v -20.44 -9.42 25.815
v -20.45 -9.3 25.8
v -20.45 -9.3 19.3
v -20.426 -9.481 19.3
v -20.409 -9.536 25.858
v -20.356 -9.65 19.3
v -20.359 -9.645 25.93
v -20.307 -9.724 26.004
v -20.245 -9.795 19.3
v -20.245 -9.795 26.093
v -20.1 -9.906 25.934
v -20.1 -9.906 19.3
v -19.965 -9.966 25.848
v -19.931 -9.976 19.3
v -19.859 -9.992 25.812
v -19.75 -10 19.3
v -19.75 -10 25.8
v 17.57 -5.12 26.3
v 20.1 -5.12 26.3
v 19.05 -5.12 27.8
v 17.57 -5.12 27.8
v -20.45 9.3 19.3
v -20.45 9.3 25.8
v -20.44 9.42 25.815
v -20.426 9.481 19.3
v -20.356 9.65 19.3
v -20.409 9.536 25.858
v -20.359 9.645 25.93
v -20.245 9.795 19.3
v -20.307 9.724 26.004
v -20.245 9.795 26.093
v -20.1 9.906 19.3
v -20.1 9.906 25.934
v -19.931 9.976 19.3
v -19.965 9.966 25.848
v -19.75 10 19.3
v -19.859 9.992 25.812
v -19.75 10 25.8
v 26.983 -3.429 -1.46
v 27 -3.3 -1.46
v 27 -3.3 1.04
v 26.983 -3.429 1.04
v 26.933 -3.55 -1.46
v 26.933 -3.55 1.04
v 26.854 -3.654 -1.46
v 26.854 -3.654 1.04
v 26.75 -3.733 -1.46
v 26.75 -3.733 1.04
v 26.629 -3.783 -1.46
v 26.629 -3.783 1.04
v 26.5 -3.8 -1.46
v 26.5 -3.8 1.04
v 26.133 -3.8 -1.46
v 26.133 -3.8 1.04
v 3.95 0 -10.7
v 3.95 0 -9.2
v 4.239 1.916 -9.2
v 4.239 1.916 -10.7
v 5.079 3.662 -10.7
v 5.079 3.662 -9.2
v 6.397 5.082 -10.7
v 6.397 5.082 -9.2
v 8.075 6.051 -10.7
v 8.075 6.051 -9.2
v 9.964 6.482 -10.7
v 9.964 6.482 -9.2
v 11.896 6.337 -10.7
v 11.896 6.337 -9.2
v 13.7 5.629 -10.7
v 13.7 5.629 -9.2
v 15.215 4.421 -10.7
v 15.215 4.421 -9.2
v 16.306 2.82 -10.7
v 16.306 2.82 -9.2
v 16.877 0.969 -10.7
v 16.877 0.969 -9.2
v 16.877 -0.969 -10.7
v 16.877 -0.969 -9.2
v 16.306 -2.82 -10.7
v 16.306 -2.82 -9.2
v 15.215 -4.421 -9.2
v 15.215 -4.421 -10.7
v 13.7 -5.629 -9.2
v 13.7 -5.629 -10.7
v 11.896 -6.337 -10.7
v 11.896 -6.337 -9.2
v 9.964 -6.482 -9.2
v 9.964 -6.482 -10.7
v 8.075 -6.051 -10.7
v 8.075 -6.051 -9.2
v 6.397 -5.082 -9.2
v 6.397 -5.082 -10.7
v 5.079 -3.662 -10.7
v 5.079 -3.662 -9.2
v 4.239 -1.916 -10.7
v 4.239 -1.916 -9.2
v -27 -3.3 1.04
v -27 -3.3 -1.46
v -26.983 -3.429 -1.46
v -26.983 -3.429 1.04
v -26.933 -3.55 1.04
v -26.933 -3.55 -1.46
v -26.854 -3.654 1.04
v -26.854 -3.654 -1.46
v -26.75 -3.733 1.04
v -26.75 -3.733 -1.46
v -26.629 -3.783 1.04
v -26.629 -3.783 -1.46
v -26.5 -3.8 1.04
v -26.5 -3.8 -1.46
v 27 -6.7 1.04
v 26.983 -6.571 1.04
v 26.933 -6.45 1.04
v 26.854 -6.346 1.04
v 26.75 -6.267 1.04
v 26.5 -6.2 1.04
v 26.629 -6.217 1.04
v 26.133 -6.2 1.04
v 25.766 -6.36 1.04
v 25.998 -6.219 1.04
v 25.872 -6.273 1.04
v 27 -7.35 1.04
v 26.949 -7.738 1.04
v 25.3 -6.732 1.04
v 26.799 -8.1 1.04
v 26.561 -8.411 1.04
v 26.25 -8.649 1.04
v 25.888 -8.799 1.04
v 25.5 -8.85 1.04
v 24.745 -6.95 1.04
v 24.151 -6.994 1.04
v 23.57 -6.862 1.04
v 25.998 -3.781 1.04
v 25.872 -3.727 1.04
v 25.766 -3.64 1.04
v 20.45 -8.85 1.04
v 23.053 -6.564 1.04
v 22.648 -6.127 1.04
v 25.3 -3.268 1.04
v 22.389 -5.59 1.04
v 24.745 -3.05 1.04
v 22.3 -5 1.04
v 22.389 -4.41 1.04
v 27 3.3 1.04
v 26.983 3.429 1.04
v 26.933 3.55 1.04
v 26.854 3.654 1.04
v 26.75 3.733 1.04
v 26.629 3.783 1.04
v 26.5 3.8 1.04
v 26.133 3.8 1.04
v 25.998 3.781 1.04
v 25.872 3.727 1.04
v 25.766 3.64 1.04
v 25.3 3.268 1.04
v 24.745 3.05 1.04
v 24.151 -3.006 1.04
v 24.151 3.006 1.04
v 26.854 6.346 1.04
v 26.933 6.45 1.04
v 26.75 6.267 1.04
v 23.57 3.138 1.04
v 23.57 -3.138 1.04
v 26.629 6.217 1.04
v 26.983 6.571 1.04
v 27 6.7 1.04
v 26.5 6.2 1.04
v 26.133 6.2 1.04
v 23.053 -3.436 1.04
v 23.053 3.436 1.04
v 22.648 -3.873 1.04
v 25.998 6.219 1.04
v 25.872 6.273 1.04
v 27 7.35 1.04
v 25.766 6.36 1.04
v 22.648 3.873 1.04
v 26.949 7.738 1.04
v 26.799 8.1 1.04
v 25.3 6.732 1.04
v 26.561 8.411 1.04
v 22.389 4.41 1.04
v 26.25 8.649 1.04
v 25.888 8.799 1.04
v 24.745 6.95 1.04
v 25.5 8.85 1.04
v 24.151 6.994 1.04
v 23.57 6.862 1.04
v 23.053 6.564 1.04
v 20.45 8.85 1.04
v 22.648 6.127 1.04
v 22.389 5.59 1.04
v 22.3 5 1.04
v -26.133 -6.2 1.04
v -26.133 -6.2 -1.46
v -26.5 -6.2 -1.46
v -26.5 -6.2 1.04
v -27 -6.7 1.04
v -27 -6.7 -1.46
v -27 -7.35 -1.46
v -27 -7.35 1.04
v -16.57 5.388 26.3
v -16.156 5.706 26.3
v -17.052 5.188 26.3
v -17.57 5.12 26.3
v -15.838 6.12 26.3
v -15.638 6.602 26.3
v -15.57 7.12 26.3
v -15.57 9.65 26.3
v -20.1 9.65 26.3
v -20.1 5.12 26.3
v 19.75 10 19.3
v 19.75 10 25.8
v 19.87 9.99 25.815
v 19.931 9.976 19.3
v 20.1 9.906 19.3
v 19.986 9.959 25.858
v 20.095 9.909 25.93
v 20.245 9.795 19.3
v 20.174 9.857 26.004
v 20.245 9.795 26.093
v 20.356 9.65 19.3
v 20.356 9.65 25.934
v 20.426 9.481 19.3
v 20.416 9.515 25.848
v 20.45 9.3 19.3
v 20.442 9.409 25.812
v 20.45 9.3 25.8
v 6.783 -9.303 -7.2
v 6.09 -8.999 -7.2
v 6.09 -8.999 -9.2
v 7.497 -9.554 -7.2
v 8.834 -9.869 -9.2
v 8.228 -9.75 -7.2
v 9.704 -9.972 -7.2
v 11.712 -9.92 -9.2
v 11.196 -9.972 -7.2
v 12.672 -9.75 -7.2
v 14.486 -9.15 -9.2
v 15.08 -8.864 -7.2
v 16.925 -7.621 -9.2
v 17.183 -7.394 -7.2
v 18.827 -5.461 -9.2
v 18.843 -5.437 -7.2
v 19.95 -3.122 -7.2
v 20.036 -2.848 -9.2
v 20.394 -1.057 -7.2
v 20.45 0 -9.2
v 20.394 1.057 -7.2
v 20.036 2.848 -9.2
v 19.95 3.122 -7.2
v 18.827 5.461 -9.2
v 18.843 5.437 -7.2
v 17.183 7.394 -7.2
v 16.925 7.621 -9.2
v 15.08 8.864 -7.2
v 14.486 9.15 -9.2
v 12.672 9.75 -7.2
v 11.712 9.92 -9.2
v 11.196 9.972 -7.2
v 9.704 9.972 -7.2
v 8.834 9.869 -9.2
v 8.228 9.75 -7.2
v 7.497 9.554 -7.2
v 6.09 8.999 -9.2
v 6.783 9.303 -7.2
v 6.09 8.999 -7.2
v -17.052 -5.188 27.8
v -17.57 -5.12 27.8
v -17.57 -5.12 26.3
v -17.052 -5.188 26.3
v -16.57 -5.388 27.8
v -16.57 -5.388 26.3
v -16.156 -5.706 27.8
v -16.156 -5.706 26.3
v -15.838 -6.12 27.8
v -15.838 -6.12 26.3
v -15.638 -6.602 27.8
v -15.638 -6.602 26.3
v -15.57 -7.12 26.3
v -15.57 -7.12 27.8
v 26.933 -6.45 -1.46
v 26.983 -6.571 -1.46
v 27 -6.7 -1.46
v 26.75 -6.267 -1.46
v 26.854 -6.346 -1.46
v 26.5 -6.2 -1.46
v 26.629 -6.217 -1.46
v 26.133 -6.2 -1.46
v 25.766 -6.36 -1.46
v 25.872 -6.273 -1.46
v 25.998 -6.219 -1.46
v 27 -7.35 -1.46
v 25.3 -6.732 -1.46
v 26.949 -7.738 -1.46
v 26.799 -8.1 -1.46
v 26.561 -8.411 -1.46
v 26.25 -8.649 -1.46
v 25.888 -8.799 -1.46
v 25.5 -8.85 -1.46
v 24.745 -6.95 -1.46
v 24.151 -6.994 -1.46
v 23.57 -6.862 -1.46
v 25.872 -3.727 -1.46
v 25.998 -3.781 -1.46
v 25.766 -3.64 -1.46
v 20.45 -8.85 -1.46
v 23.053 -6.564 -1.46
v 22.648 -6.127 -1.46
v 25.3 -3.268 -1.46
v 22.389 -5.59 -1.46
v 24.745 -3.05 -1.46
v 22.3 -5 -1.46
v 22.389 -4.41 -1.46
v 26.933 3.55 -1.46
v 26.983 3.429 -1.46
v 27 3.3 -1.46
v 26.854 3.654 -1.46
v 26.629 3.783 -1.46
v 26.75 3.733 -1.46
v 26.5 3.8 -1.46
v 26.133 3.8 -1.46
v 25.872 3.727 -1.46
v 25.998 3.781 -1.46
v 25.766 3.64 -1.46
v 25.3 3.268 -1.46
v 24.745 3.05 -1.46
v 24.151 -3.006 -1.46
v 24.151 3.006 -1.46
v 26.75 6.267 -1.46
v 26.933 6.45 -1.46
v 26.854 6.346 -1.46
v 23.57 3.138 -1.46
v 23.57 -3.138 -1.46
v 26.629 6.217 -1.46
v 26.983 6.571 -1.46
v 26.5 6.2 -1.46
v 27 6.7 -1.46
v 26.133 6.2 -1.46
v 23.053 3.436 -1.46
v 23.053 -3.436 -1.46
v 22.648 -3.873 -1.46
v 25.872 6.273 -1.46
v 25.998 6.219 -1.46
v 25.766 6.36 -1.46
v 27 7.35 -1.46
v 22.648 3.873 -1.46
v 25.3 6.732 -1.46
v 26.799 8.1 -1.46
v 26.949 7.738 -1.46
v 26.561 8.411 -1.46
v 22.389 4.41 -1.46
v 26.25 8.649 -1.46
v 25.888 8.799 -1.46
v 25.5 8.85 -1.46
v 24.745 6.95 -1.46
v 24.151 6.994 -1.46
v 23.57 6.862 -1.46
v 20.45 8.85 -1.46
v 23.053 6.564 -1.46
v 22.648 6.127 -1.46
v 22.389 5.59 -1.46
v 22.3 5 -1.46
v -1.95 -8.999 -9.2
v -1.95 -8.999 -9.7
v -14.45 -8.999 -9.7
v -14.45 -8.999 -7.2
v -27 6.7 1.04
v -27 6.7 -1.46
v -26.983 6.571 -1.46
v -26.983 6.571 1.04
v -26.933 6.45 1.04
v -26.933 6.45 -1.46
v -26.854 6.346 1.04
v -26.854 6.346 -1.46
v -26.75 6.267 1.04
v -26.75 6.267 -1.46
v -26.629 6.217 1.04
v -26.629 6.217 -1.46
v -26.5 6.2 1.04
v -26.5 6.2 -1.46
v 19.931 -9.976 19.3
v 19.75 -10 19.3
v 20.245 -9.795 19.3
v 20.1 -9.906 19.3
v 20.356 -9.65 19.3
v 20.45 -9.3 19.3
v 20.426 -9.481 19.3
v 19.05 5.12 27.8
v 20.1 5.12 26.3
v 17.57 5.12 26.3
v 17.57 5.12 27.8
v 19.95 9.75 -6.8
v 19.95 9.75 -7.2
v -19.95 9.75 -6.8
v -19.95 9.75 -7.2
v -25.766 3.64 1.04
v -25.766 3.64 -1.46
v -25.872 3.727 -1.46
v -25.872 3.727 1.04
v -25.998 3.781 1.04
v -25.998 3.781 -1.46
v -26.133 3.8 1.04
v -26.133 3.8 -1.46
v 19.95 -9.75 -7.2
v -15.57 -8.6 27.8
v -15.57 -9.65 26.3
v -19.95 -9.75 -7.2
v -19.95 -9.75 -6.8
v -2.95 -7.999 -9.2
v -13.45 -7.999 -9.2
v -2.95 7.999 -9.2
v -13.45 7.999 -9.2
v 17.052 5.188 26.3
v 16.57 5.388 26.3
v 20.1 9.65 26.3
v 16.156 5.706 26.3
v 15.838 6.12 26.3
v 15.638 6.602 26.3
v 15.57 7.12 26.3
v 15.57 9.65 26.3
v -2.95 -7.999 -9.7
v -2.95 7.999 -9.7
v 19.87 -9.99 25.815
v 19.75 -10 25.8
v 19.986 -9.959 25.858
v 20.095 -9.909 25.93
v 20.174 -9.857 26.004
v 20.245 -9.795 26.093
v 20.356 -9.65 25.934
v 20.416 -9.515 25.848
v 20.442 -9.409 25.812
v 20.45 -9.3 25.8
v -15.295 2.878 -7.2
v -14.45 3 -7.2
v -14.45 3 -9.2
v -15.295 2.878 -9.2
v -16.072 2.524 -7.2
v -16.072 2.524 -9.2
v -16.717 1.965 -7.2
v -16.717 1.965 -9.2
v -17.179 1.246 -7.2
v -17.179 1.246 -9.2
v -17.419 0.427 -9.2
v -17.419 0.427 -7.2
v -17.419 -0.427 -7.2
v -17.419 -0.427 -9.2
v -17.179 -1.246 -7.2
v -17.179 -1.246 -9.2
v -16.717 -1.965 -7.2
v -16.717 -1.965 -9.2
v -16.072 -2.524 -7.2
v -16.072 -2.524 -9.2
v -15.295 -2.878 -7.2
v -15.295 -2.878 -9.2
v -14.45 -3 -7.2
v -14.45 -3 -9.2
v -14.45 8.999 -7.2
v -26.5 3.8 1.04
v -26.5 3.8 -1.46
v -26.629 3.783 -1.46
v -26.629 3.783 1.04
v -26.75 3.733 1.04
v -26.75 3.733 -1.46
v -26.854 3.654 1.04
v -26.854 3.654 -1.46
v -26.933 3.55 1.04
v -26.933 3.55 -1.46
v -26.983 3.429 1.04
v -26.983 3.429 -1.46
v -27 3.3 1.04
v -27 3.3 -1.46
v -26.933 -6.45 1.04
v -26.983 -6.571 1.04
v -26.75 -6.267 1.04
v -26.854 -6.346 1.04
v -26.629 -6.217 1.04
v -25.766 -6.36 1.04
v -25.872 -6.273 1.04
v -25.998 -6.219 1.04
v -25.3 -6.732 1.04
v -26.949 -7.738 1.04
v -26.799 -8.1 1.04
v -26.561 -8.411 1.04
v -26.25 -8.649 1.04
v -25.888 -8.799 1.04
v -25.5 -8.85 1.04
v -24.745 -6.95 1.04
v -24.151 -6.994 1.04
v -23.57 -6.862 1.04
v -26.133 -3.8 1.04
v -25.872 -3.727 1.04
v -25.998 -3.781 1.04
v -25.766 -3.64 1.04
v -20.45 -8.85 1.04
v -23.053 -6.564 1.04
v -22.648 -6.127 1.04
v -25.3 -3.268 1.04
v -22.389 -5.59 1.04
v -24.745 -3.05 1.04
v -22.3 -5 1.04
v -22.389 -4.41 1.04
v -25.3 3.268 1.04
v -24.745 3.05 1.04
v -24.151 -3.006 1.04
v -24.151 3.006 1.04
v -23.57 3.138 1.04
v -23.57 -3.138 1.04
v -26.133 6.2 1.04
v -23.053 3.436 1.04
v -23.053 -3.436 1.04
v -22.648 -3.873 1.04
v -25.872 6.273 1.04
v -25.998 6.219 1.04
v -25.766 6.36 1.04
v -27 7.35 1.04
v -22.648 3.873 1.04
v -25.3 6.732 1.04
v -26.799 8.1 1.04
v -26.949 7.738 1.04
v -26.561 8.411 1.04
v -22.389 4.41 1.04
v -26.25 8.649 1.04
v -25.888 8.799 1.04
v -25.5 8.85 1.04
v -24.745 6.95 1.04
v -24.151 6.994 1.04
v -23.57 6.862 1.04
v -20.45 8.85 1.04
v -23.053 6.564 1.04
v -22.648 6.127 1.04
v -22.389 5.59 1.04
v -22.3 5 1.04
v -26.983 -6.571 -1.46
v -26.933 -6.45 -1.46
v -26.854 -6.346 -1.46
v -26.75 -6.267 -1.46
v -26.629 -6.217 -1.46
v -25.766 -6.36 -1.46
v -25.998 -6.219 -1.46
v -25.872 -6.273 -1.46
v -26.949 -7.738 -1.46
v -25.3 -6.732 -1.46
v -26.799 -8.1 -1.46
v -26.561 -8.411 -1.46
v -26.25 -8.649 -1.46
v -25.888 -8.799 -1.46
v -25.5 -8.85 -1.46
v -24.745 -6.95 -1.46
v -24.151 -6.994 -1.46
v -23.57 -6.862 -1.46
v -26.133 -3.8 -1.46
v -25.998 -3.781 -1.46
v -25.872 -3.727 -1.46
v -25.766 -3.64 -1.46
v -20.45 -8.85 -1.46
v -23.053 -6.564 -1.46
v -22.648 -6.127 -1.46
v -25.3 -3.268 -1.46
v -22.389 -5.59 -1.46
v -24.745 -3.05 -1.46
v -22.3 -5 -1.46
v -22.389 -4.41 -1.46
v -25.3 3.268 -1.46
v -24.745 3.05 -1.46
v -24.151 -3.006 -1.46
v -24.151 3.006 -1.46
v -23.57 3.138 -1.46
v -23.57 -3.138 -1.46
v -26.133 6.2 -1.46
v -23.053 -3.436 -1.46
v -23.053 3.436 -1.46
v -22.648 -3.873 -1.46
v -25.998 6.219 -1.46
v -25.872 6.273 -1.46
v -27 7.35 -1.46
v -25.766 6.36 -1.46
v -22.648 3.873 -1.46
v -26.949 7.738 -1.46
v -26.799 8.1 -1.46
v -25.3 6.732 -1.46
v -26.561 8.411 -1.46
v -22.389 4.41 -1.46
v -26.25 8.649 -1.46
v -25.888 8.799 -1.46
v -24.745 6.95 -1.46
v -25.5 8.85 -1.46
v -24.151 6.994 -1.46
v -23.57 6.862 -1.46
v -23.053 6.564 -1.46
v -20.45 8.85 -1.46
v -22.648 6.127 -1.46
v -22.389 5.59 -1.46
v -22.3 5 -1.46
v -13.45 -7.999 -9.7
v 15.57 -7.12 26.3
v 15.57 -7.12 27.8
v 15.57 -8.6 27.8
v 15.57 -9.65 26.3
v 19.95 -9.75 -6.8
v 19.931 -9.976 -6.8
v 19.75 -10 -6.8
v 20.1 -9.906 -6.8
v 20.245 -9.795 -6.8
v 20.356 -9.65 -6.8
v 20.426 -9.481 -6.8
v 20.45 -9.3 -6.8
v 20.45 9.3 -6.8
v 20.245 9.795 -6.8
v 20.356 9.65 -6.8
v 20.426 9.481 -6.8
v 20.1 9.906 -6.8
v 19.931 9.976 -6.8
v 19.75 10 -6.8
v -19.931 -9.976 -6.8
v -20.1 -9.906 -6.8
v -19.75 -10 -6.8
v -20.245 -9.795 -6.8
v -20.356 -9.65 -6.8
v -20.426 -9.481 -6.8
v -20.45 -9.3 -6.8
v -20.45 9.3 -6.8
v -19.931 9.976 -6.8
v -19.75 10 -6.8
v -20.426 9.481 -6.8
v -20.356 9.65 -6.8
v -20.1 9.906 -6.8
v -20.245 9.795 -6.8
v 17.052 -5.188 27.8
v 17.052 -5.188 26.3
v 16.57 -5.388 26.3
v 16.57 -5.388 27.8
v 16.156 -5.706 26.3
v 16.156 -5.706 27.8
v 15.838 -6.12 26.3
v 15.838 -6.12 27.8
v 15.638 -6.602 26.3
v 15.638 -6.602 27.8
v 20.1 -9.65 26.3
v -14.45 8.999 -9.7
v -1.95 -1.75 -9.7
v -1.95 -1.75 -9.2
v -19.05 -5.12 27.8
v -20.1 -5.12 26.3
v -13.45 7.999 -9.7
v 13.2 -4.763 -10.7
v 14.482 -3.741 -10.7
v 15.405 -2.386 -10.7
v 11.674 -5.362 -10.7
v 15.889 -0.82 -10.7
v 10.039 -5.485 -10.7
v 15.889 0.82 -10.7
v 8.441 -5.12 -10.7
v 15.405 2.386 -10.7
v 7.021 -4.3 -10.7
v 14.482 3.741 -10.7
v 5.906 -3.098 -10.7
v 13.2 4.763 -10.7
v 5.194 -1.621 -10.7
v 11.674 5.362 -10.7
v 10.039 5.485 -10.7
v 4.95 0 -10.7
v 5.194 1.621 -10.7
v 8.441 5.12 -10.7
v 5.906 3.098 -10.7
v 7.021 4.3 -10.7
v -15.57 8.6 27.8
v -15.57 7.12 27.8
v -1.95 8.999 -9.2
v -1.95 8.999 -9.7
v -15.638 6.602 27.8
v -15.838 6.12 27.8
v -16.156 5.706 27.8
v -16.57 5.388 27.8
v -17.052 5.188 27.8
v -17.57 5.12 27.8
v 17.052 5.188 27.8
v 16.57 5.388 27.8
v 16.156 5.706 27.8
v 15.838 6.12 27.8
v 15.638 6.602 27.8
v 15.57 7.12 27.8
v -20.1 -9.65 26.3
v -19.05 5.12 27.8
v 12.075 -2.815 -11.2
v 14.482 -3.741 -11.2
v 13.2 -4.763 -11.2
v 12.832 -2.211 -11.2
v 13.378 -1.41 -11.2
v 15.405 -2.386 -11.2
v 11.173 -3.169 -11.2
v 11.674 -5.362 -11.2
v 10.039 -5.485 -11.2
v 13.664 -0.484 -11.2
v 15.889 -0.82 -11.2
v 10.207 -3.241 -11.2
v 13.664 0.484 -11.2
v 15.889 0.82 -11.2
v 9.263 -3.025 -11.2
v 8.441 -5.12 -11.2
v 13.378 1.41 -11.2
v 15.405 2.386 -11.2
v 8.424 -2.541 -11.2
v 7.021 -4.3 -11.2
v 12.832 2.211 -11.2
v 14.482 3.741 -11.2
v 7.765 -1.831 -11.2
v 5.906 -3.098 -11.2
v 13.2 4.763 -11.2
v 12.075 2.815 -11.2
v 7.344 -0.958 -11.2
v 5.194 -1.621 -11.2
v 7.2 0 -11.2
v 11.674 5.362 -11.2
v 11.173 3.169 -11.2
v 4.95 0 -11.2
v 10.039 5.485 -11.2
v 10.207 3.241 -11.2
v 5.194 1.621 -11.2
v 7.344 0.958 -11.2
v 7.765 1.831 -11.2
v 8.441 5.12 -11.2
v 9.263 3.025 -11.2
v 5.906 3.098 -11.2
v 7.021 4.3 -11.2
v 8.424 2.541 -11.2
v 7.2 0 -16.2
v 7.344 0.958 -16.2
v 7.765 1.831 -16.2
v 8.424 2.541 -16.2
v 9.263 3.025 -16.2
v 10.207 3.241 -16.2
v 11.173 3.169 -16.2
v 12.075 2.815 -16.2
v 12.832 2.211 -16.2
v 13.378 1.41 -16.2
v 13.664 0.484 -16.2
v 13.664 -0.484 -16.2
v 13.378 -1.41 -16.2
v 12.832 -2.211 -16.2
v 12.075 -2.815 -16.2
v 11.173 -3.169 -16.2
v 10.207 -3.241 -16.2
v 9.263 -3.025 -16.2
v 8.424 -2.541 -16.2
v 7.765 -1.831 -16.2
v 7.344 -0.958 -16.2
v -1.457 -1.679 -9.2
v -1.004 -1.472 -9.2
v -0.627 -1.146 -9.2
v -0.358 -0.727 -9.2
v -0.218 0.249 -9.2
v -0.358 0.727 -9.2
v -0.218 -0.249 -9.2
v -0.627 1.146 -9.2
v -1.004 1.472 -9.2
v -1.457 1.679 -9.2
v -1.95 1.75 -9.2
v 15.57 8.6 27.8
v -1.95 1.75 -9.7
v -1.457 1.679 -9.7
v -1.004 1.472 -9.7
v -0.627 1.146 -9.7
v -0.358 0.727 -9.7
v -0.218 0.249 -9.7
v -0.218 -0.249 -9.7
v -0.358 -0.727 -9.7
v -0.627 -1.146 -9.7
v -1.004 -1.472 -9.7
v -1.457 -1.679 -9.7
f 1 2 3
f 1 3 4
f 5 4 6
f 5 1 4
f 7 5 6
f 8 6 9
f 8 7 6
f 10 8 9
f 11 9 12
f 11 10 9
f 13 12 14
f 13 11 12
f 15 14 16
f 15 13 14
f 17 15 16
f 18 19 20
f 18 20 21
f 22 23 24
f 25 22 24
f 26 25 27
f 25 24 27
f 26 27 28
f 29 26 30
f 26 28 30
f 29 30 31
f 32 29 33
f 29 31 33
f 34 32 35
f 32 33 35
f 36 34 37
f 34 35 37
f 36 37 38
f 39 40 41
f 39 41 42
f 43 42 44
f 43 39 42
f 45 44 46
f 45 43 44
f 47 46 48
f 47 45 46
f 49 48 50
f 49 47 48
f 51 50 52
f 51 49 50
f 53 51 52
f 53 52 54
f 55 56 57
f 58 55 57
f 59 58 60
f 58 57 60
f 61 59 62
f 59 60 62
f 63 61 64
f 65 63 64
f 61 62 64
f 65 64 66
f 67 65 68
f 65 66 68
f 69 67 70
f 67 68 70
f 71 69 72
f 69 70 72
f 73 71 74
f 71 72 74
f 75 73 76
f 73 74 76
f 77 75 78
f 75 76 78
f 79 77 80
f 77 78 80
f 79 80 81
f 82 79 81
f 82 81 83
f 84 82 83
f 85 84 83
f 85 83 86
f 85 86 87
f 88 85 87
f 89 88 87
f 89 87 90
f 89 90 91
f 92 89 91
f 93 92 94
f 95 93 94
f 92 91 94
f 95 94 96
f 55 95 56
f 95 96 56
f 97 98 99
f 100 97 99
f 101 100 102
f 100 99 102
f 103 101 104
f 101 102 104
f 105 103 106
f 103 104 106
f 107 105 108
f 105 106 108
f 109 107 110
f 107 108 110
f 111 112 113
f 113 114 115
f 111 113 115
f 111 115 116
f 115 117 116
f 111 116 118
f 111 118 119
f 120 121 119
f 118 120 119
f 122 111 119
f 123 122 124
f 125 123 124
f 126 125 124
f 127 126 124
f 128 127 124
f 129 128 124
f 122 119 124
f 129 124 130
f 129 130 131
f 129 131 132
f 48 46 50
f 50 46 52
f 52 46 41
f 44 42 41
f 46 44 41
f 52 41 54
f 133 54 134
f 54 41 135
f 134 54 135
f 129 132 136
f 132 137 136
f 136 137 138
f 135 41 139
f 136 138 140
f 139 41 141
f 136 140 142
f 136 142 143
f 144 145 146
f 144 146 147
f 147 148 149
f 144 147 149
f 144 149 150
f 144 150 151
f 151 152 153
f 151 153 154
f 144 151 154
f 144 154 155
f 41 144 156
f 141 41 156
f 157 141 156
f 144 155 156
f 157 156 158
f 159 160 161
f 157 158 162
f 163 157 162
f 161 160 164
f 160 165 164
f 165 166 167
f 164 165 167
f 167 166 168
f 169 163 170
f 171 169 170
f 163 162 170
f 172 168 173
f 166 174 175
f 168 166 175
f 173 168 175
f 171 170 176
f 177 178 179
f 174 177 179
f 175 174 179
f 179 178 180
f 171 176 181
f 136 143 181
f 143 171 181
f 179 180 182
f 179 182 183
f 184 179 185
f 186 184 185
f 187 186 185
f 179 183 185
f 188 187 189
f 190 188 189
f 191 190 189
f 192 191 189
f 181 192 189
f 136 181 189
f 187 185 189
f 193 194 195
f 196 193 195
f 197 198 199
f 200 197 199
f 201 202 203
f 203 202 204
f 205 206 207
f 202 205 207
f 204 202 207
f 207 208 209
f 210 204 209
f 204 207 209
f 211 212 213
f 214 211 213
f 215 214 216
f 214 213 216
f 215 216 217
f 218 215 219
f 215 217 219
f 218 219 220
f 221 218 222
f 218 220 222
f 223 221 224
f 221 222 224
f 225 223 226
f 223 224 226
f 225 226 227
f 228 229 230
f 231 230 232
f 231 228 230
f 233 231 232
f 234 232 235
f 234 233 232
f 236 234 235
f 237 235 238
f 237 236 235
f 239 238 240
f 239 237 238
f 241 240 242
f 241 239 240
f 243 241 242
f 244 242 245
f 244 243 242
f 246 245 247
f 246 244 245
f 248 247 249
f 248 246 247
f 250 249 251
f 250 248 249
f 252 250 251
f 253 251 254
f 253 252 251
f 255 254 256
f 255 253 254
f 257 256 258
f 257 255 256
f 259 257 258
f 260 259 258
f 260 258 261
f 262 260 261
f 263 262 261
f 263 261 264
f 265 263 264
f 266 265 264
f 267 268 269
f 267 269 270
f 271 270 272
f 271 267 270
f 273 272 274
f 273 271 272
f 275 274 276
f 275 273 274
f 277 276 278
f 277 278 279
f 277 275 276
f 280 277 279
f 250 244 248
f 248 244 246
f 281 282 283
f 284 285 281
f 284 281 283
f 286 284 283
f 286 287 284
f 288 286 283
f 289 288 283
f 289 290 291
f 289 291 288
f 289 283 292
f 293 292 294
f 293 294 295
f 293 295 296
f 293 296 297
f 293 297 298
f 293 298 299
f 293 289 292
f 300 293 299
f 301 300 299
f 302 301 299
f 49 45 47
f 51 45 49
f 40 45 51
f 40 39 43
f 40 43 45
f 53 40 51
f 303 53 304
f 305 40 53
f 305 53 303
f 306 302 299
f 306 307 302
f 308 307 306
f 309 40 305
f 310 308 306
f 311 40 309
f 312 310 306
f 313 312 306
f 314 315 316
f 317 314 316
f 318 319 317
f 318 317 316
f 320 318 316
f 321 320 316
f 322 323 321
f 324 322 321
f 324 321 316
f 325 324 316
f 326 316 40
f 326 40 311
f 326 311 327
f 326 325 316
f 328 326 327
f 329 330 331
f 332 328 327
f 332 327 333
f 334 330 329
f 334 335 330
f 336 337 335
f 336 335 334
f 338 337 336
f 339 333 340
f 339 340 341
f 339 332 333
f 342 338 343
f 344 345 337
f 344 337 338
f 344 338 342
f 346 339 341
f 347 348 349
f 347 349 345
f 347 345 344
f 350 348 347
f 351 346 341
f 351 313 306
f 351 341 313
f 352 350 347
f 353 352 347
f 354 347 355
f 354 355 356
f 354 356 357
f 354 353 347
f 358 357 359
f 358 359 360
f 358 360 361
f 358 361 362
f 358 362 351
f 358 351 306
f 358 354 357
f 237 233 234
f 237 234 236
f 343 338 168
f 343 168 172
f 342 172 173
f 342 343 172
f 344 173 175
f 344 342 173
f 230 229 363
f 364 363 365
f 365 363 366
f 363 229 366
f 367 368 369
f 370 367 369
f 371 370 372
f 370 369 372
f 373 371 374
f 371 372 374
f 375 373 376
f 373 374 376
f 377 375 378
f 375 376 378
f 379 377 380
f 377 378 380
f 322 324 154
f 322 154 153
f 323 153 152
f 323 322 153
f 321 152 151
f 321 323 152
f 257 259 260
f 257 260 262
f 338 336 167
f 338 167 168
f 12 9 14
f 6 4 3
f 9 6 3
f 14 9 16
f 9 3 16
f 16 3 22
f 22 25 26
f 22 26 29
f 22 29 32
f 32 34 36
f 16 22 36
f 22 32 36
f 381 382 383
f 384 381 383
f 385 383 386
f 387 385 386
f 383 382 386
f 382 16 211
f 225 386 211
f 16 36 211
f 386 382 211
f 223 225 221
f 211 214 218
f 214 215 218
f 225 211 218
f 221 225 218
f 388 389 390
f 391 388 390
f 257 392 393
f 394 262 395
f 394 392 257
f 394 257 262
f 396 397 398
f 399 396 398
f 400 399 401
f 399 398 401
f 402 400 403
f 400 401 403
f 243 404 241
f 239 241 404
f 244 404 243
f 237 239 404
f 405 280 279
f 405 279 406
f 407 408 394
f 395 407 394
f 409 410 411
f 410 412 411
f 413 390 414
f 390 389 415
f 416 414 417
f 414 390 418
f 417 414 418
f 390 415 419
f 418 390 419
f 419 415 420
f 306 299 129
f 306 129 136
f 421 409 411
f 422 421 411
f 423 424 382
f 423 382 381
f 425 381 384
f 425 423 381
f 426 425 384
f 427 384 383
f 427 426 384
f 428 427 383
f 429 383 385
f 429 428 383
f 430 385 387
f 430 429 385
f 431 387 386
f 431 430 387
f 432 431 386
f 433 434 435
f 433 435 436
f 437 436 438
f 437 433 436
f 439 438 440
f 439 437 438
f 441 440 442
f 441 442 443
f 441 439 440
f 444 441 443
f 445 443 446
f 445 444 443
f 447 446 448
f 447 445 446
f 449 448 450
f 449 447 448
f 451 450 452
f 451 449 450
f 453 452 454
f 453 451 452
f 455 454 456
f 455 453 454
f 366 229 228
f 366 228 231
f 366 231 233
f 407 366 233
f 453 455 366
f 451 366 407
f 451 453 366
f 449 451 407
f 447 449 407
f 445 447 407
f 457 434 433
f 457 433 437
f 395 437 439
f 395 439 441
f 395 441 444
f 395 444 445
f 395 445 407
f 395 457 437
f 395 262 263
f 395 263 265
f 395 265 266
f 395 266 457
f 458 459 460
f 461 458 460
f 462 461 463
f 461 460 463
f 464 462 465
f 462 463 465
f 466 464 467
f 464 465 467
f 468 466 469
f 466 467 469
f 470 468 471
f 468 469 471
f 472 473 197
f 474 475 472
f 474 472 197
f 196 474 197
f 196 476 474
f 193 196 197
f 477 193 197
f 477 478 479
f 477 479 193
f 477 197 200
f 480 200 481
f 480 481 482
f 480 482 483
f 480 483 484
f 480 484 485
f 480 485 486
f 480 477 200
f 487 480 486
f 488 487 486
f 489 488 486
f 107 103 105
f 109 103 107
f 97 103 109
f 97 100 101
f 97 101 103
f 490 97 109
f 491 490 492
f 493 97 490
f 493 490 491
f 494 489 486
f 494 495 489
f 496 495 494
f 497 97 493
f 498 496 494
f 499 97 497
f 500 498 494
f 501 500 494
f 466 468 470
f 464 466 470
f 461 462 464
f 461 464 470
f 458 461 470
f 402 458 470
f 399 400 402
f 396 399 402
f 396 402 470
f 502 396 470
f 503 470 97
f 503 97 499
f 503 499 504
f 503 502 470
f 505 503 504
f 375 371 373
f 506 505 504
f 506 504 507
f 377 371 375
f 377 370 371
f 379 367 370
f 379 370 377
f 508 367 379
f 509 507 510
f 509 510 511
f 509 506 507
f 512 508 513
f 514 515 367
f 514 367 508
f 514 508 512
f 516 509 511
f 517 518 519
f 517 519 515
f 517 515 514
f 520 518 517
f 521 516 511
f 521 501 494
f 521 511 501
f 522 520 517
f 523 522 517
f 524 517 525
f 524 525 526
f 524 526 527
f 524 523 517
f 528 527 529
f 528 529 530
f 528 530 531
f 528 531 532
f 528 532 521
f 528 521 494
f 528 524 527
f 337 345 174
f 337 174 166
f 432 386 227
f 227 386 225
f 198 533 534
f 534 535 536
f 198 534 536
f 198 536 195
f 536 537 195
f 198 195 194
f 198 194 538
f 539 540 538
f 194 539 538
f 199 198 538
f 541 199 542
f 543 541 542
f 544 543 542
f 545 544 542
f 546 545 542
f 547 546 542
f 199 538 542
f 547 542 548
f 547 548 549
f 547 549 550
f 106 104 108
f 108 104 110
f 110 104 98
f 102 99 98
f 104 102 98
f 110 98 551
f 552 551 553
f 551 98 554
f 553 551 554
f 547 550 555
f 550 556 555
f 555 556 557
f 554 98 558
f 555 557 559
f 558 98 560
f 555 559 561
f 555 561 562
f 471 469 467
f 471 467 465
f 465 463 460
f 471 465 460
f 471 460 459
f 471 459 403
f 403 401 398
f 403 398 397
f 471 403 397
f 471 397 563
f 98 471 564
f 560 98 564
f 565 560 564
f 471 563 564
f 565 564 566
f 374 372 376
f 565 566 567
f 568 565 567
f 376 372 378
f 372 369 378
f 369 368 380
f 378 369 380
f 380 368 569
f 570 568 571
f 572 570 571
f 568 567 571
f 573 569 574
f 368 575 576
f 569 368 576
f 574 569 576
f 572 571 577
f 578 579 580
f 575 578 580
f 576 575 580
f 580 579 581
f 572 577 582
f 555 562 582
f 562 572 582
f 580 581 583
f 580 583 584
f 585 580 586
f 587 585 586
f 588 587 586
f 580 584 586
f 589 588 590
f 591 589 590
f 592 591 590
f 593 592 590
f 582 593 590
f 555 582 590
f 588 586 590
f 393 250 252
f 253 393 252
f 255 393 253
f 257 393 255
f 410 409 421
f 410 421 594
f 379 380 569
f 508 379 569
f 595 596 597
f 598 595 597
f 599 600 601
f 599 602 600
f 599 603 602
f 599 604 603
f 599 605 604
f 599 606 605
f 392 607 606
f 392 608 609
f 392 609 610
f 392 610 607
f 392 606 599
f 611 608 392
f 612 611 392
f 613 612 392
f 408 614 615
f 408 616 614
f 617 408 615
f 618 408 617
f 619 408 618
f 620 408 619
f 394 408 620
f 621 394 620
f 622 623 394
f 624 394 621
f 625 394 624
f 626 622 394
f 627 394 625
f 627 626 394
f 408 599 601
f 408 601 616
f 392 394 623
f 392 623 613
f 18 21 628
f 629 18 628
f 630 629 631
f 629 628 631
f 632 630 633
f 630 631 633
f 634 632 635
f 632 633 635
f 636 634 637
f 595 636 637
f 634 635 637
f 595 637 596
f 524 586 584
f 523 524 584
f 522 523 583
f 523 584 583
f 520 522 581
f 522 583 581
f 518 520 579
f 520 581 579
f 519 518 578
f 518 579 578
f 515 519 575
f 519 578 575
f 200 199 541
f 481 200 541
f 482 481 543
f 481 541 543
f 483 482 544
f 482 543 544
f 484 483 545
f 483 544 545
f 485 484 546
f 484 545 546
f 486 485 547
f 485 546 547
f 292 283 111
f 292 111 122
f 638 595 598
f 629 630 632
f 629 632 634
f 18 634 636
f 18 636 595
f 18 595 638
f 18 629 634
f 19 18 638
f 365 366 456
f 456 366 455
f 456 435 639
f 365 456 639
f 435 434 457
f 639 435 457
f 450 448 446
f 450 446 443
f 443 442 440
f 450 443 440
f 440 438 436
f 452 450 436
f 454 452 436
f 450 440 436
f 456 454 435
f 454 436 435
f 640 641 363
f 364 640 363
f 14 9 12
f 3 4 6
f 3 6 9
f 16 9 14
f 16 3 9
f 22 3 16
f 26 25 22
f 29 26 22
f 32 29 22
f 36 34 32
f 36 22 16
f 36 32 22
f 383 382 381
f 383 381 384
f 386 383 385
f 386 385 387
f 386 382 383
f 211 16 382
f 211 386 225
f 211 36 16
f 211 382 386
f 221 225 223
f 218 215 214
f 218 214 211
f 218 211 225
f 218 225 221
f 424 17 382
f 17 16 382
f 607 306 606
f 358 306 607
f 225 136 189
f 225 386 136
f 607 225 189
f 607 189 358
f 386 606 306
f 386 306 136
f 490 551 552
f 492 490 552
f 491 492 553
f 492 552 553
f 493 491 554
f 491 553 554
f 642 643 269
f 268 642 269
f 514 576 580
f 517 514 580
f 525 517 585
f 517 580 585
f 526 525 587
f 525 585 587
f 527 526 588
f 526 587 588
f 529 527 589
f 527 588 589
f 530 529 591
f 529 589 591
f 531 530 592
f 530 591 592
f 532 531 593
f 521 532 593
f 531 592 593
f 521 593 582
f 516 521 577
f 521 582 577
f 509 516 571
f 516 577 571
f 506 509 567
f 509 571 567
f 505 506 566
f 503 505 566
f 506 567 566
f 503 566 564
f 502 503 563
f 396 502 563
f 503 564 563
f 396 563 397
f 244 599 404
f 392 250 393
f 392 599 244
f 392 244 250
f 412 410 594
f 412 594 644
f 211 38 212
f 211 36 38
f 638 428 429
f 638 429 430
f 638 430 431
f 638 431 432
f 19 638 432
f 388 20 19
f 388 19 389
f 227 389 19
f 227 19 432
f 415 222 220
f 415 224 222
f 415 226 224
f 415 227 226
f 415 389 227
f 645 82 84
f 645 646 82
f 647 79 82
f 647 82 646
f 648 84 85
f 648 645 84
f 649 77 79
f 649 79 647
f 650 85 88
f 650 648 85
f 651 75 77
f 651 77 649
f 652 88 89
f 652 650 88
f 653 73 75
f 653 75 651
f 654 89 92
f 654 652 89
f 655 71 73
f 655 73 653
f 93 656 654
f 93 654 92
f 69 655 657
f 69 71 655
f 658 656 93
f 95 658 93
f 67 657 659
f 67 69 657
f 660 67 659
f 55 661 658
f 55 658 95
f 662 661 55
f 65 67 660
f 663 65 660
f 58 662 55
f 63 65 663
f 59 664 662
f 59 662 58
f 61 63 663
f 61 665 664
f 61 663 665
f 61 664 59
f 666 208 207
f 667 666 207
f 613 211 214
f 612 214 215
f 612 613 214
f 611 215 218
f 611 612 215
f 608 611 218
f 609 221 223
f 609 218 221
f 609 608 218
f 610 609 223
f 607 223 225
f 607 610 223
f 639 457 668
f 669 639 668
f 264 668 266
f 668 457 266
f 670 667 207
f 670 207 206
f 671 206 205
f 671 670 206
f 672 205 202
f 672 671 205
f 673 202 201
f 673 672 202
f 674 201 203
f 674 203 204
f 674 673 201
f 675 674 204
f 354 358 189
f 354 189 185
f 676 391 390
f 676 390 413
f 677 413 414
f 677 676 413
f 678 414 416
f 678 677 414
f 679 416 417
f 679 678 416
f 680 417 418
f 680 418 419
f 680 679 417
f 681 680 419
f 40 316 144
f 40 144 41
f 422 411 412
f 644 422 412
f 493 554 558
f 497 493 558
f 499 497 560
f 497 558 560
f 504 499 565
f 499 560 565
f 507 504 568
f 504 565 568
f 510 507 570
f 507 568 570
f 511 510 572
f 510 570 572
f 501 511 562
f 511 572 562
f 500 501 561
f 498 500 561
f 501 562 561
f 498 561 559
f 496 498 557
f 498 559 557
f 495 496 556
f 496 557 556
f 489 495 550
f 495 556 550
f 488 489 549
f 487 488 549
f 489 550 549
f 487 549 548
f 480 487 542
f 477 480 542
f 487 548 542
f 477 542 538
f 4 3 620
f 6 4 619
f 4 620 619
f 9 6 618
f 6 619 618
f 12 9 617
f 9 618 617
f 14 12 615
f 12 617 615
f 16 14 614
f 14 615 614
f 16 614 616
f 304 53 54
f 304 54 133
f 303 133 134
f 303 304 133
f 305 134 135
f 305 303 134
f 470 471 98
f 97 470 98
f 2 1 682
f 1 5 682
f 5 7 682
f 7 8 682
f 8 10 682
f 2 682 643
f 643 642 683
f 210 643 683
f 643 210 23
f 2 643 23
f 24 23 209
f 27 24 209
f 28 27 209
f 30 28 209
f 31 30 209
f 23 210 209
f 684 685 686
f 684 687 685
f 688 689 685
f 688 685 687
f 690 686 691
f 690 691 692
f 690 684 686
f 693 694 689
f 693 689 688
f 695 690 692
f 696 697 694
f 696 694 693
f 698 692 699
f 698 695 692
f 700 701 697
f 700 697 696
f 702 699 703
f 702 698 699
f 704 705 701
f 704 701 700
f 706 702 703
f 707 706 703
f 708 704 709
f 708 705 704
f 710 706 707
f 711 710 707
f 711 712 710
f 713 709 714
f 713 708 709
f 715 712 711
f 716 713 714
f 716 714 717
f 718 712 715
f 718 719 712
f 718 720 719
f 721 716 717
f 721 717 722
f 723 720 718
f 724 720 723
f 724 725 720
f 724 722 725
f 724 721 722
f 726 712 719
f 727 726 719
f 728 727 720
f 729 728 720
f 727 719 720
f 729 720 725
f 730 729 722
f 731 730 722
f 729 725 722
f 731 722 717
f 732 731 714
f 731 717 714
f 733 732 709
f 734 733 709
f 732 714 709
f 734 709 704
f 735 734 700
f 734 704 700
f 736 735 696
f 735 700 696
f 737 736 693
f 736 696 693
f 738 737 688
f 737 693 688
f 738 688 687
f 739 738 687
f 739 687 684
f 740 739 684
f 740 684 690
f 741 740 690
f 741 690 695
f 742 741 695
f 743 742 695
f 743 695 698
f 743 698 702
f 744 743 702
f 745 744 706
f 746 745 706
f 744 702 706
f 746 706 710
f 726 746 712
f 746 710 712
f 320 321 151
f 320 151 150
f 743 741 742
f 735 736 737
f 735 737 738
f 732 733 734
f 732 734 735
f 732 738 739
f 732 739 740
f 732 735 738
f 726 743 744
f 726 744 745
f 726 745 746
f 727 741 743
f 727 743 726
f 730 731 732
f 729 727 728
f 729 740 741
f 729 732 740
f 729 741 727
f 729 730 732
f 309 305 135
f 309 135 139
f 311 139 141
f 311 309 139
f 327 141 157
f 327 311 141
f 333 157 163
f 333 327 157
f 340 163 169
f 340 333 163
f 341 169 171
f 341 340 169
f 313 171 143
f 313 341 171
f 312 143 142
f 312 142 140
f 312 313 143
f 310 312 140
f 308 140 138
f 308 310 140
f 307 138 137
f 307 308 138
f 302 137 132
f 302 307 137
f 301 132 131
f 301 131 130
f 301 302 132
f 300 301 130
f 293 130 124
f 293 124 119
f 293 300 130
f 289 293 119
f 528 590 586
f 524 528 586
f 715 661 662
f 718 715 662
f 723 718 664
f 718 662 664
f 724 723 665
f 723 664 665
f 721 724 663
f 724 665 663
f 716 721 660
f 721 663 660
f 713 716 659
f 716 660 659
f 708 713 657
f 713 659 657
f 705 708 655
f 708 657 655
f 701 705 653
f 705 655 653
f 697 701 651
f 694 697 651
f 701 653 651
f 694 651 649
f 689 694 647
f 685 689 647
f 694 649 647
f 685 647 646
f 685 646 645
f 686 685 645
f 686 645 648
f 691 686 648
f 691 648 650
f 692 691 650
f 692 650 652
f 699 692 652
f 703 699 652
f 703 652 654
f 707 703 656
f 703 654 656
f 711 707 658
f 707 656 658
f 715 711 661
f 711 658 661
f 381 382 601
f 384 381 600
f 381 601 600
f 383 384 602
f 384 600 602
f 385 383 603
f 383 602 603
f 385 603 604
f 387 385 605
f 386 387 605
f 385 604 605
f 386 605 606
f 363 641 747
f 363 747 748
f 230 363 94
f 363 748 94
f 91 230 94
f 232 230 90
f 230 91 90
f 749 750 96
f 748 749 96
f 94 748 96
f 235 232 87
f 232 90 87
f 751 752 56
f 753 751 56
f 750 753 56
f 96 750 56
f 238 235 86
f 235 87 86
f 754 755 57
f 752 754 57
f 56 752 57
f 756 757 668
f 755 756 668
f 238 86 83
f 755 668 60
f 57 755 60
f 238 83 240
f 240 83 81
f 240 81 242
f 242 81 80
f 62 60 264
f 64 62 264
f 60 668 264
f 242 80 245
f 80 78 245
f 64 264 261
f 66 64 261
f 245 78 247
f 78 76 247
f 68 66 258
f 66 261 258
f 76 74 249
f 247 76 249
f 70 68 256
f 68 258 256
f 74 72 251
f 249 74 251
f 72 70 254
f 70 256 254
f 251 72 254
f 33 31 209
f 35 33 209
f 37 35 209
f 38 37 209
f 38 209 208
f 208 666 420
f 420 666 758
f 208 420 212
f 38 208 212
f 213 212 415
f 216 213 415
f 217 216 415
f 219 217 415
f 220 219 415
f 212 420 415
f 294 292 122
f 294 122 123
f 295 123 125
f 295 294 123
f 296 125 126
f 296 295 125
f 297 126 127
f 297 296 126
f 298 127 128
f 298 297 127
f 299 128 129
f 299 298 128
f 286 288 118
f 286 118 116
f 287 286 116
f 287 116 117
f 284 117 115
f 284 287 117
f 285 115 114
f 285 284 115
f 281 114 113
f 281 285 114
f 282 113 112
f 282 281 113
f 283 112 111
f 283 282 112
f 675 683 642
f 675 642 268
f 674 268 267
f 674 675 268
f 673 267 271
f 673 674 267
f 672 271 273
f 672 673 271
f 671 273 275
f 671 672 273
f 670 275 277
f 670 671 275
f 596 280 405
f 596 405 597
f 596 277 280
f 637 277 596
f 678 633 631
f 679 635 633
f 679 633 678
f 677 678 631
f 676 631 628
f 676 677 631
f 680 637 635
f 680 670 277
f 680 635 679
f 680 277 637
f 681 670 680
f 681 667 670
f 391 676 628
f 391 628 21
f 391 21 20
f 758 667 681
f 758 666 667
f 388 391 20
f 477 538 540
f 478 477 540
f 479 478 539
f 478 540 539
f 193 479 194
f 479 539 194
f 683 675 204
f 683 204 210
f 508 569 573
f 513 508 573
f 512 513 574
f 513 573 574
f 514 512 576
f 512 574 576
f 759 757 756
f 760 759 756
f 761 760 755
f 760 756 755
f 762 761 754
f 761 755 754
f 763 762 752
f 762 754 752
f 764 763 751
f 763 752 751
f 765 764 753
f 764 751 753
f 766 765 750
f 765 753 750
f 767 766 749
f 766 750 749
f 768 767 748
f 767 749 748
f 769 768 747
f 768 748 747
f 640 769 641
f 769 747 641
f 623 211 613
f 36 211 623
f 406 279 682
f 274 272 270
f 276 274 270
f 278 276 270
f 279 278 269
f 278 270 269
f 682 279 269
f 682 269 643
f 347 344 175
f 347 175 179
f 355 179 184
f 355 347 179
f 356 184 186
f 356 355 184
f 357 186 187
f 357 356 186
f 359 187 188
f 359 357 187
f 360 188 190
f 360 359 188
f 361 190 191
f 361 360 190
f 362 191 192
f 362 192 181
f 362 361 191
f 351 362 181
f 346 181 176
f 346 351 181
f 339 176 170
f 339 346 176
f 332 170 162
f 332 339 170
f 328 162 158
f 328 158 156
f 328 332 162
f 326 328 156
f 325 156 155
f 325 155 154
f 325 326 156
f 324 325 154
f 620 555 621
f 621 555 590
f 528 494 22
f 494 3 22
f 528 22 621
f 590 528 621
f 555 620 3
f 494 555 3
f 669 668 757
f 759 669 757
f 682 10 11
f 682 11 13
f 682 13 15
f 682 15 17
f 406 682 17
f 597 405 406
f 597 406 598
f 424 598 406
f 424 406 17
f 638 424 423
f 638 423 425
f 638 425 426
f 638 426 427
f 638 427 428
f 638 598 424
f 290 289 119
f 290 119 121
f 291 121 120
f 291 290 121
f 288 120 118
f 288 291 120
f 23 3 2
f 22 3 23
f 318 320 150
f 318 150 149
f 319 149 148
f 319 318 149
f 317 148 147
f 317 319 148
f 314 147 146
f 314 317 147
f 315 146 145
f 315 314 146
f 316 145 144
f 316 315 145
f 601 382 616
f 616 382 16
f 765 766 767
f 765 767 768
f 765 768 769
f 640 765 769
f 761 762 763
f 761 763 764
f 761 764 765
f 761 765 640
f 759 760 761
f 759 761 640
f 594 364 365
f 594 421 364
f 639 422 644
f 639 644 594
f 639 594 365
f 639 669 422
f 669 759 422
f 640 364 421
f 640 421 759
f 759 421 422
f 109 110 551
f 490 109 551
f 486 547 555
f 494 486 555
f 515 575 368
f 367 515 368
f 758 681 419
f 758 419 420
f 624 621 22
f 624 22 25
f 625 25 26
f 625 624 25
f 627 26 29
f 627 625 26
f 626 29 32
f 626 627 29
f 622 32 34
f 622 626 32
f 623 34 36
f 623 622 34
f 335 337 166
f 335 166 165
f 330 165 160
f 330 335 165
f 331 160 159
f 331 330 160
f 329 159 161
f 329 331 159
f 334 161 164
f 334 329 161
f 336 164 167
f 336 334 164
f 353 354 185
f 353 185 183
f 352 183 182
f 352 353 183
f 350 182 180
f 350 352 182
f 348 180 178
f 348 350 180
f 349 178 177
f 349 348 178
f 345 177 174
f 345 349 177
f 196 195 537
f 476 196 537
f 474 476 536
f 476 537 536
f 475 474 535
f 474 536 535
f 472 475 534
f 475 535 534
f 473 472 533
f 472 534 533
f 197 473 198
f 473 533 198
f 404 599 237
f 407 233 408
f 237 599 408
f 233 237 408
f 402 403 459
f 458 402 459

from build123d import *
from OCP.BRepFilletAPI import BRepFilletAPI_MakeChamfer

# Parameters (mm, degrees)
SKETCH1_W            = 40.9
SKETCH1_H            = 20
BOSS_EXTRUDE1_DEPTH  = 19.3
SKETCH3_W            = 40.9
SKETCH3_H            = 20
BOSS_EXTRUDE2_DEPTH  = 6.8
SKETCH4_W            = 40.9
SKETCH4_H            = 20
BOSS_EXTRUDE3_DEPTH  = 8.5
CHAMFER1_SIZE        = 2
CHAMFER1_SIZE2       = 1.400415076
CUT_EXTRUDE1_DEPTH   = 1.5
SKETCH6_W            = 39.9
SKETCH6_H            = 19.5
BOSS_EXTRUDE4_DEPTH  = 0.4
BOSS_EXTRUDE5_DEPTH  = 2
SKETCH8_R            = 6.5
BOSS_EXTRUDE6_DEPTH  = 1.5
SKETCH9_R            = 5.5
BOSS_EXTRUDE8_DEPTH  = 0.5
SKETCH11_R           = 3.25
BOSS_EXTRUDE9_DEPTH  = 5
SKETCH12_W           = 10.5
SKETCH12_H           = 15.998933302
BOSS_EXTRUDE10_DEPTH = 0.5
FILLET1_R            = 0.7
FILLET2_R            = 0.7
FILLET3_R            = 0.7
BOSS_EXTRUDE11_START = -5.74
BOSS_EXTRUDE11_DEPTH = 2.5


with BuildPart() as part:
    # Sketch1 → Boss-Extrude1 (new body)
    with BuildSketch(Plane.XY):
        Rectangle(SKETCH1_W, SKETCH1_H)
    extrude(amount=BOSS_EXTRUDE1_DEPTH)

    # Fillet1
    fillet1_edges = [part.edges().sort_by_distance(p)[0] for p in [
        (-20.45, 10, 9.65),
        (20.45, 10, 9.65),
        (20.45, -10, 9.65),
        (-20.45, -10, 9.65),
    ]]
    fillet(fillet1_edges, radius=FILLET1_R)



with BuildPart() as body_2:
    # Sketch3 → Boss-Extrude2 (new body)
    with BuildSketch(Plane(origin=(0, 0, 0), x_dir=(-1, 0, 0), z_dir=(0, 0, -1))):
        Rectangle(SKETCH3_W, SKETCH3_H)
    extrude(amount=BOSS_EXTRUDE2_DEPTH)

    # Sketch6 → Boss-Extrude4 (add)
    with BuildSketch(Plane(origin=(0, 0, -6.8), x_dir=(-1, 0, 0), z_dir=(0, 0, -1))):
        Rectangle(SKETCH6_W, SKETCH6_H)
    extrude(amount=BOSS_EXTRUDE4_DEPTH)

    # Sketch7 → Boss-Extrude5 (add)
    with BuildSketch(Plane(origin=(0, 0, -7.2), x_dir=(-1, 0, 0), z_dir=(0, 0, -1))):
        with BuildLine():
            Line((-6.09, 8.999466651), (14.45, 8.999466651))
            Line((14.45, 8.999466651), (14.45, 3))
            ThreePointArc((14.45, 3), (17.45, 0), (14.45, -3))
            Line((14.45, -3), (14.45, -8.999466651))
            Line((14.45, -8.999466651), (-6.09, -8.999466651))
            ThreePointArc((-6.09, -8.999466651), (-20.45, 0), (-6.09, 8.999466651))
        make_face()
    extrude(amount=BOSS_EXTRUDE5_DEPTH)

    # Sketch8 → Boss-Extrude6 (add)
    with BuildSketch(Plane(origin=(0, 0, -9.2), x_dir=(-1, 0, 0), z_dir=(0, 0, -1))):
        with Locations((-10.45, 0)):
            Circle(SKETCH8_R)
    extrude(amount=BOSS_EXTRUDE6_DEPTH)

    # Sketch9 → Boss-Extrude8 (add)
    with BuildSketch(Plane(origin=(0, 0, -10.7), x_dir=(-1, 0, 0), z_dir=(0, 0, -1))):
        with Locations((-10.45, 0)):
            Circle(SKETCH9_R)
    extrude(amount=BOSS_EXTRUDE8_DEPTH)

    # Sketch11 → Boss-Extrude9 (add)
    with BuildSketch(Plane(origin=(0, 0, -11.2), x_dir=(-1, 0, 0), z_dir=(0, 0, -1))):
        with Locations((-10.45, 0)):
            Circle(SKETCH11_R)
    extrude(amount=BOSS_EXTRUDE9_DEPTH)

    # Sketch12 → Boss-Extrude10 (add)
    with BuildSketch(Plane(origin=(0, 0, -9.2), x_dir=(-1, 0, 0), z_dir=(0, 0, -1))):
        with BuildLine():
            Line((14.45, 8.999466651), (1.95, 8.999466651))
            Line((1.95, 8.999466651), (1.95, 1.75))
            ThreePointArc((1.95, 1.75), (0.2, 0), (1.95, -1.75))
            Line((1.95, -1.75), (1.95, -8.999466651))
            Line((1.95, -8.999466651), (14.45, -8.999466651))
            Line((14.45, -8.999466651), (14.45, 8.999466651))
        make_face()
        with Locations((8.2, 0)):
            Rectangle(SKETCH12_W, SKETCH12_H, mode=Mode.SUBTRACT)
    extrude(amount=BOSS_EXTRUDE10_DEPTH)

    # Fillet2
    fillet2_edges = [body_2.edges().sort_by_distance(p)[0] for p in [
        (20.45, -10, -3.4),
        (20.45, 10, -3.4),
        (-20.45, 10, -3.4),
        (-20.45, -10, -3.4),
    ]]
    fillet(fillet2_edges, radius=FILLET2_R)


with BuildPart() as body_3:
    # Sketch4 → Boss-Extrude3 (new body)
    with BuildSketch(Plane.XY.offset(19.3)):
        Rectangle(SKETCH4_W, SKETCH4_H)
    extrude(amount=BOSS_EXTRUDE3_DEPTH)

    # Chamfer1: one chamfer whose edges measure the first distance from different faces: ONE call of the kernel's chamfer builder (chamfer() names one face for all edges)
    chamfer1_edges_1 = [body_3.edges().sort_by_distance(p)[0] for p in [
        (0, -10, 27.8),
    ]]
    chamfer1_side_1 = [body_3.faces().sort_by_distance(p)[0] for p in [
        (0, -10, 23.55),
    ]]
    chamfer1_edges_2 = [body_3.edges().sort_by_distance(p)[0] for p in [
        (20.45, 0, 27.8),
    ]]
    chamfer1_side_2 = [body_3.faces().sort_by_distance(p)[0] for p in [
        (20.45, 0, 23.55),
    ]]
    chamfer1_edges_3 = [body_3.edges().sort_by_distance(p)[0] for p in [
        (0, 10, 27.8),
    ]]
    chamfer1_side_3 = [body_3.faces().sort_by_distance(p)[0] for p in [
        (0, 10, 23.55),
    ]]
    chamfer1_edges_4 = [body_3.edges().sort_by_distance(p)[0] for p in [
        (-20.45, 0, 27.8),
    ]]
    chamfer1_side_4 = [body_3.faces().sort_by_distance(p)[0] for p in [
        (-20.45, 0, 23.55),
    ]]
    chamfer1 = BRepFilletAPI_MakeChamfer(body_3.part.solid().wrapped)
    for e in chamfer1_edges_1:
        chamfer1.Add(CHAMFER1_SIZE, CHAMFER1_SIZE2, e.wrapped, chamfer1_side_1[0].wrapped)  # the first distance lies on this face
    for e in chamfer1_edges_2:
        chamfer1.Add(CHAMFER1_SIZE, CHAMFER1_SIZE2, e.wrapped, chamfer1_side_2[0].wrapped)  # the first distance lies on this face
    for e in chamfer1_edges_3:
        chamfer1.Add(CHAMFER1_SIZE, CHAMFER1_SIZE2, e.wrapped, chamfer1_side_3[0].wrapped)  # the first distance lies on this face
    for e in chamfer1_edges_4:
        chamfer1.Add(CHAMFER1_SIZE, CHAMFER1_SIZE2, e.wrapped, chamfer1_side_4[0].wrapped)  # the first distance lies on this face
    add(Compound.cast(chamfer1.Shape()), mode=Mode.REPLACE)

    # Sketch5 → Cut-Extrude1 (cut)
    with BuildSketch(Plane.XY.offset(27.8)):
        with BuildLine():
            Line((-20.45, 10), (-15.57, 10))
            Line((-15.57, 10), (-15.57, 7.12))
            ThreePointArc((-15.57, 7.12), (-16.155786438, 5.705786438), (-17.57, 5.12))
            Line((-17.57, 5.12), (-20.45, 5.12))
            Line((-20.45, 5.12), (-20.45, 10))
        make_face()
        with BuildLine():
            Line((20.45, 5.12), (17.57, 5.12))
            ThreePointArc((17.57, 5.12), (16.155786438, 5.705786438), (15.57, 7.12))
            Line((15.57, 7.12), (15.57, 10))
            Line((15.57, 10), (20.45, 10))
            Line((20.45, 10), (20.45, 5.12))
        make_face()
        with BuildLine():
            Line((-20.45, -5.12), (-17.57, -5.12))
            ThreePointArc((-17.57, -5.12), (-16.155786438, -5.705786438), (-15.57, -7.12))
            Line((-15.57, -7.12), (-15.57, -10))
            Line((-15.57, -10), (-20.45, -10))
            Line((-20.45, -10), (-20.45, -5.12))
        make_face()
        with BuildLine():
            Line((20.45, -10), (20.45, -5.12))
            Line((20.45, -5.12), (17.57, -5.12))
            ThreePointArc((17.57, -5.12), (16.155786438, -5.705786438), (15.57, -7.12))
            Line((15.57, -7.12), (15.57, -10))
            Line((15.57, -10), (20.45, -10))
        make_face()
    extrude(amount=-CUT_EXTRUDE1_DEPTH, mode=Mode.SUBTRACT)

    # Fillet3
    fillet3_edges = [body_3.edges().sort_by_distance(p)[0] for p in [
        (20.45, 10, 22.55),
        (20.45, -10, 22.55),
        (-20.45, -10, 22.55),
        (-20.45, 10, 22.55),
    ]]
    fillet(fillet3_edges, radius=FILLET3_R)


with BuildPart() as part_1:
    add(part.part)

    add(body_2.part)  # Boss-Extrude11 merges body 2
    # Sketch13 → Boss-Extrude11 (add)
    with BuildSketch(Plane(origin=(0, 0, -7.2), x_dir=(-1, 0, 0), z_dir=(0, 0, -1)).offset(BOSS_EXTRUDE11_START)):
        with BuildLine():
            Line((20.45, 8.85), (25.5, 8.85))
            ThreePointArc((25.5, 8.85), (26.560660172, 8.410660172), (27, 7.35))
            Line((27, 7.35), (27, 6.7))
            ThreePointArc((27, 6.7), (26.853553391, 6.346446609), (26.5, 6.2))
            Line((26.5, 6.2), (26.133030278, 6.2))
            ThreePointArc((26.133030278, 6.2), (25.933030278, 6.241742431), (25.766424222, 6.36))
            ThreePointArc((25.766424222, 6.36), (22.3, 5), (25.766424222, 3.64))
            ThreePointArc((25.766424222, 3.64), (25.933030278, 3.758257569), (26.133030278, 3.8))
            Line((26.133030278, 3.8), (26.5, 3.8))
            ThreePointArc((26.5, 3.8), (26.853553391, 3.653553391), (27, 3.3))
            Line((27, 3.3), (27, -3.3))
            ThreePointArc((27, -3.3), (26.853553391, -3.653553391), (26.5, -3.8))
            Line((26.5, -3.8), (26.133030278, -3.8))
            ThreePointArc((26.133030278, -3.8), (25.933030278, -3.758257569), (25.766424222, -3.64))
            ThreePointArc((25.766424222, -3.64), (22.3, -5), (25.766424222, -6.36))
            ThreePointArc((25.766424222, -6.36), (25.933030278, -6.241742431), (26.133030278, -6.2))
            Line((26.133030278, -6.2), (26.5, -6.2))
            ThreePointArc((26.5, -6.2), (26.853553391, -6.346446609), (27, -6.7))
            Line((27, -6.7), (27, -7.35))
            ThreePointArc((27, -7.35), (26.560660172, -8.410660172), (25.5, -8.85))
            Line((25.5, -8.85), (20.45, -8.85))
            Line((20.45, -8.85), (20.45, 8.85))
        make_face()
    boss_extrude11 = extrude(amount=-BOSS_EXTRUDE11_DEPTH)

    # Mirror1: Boss-Extrude11 across plane
    add(boss_extrude11.mirror(Plane(origin=(0, 0, 0), x_dir=(0, 0, 1), z_dir=(1, 0, 0))))


solid = Compound([body_3.part, part_1.part])
